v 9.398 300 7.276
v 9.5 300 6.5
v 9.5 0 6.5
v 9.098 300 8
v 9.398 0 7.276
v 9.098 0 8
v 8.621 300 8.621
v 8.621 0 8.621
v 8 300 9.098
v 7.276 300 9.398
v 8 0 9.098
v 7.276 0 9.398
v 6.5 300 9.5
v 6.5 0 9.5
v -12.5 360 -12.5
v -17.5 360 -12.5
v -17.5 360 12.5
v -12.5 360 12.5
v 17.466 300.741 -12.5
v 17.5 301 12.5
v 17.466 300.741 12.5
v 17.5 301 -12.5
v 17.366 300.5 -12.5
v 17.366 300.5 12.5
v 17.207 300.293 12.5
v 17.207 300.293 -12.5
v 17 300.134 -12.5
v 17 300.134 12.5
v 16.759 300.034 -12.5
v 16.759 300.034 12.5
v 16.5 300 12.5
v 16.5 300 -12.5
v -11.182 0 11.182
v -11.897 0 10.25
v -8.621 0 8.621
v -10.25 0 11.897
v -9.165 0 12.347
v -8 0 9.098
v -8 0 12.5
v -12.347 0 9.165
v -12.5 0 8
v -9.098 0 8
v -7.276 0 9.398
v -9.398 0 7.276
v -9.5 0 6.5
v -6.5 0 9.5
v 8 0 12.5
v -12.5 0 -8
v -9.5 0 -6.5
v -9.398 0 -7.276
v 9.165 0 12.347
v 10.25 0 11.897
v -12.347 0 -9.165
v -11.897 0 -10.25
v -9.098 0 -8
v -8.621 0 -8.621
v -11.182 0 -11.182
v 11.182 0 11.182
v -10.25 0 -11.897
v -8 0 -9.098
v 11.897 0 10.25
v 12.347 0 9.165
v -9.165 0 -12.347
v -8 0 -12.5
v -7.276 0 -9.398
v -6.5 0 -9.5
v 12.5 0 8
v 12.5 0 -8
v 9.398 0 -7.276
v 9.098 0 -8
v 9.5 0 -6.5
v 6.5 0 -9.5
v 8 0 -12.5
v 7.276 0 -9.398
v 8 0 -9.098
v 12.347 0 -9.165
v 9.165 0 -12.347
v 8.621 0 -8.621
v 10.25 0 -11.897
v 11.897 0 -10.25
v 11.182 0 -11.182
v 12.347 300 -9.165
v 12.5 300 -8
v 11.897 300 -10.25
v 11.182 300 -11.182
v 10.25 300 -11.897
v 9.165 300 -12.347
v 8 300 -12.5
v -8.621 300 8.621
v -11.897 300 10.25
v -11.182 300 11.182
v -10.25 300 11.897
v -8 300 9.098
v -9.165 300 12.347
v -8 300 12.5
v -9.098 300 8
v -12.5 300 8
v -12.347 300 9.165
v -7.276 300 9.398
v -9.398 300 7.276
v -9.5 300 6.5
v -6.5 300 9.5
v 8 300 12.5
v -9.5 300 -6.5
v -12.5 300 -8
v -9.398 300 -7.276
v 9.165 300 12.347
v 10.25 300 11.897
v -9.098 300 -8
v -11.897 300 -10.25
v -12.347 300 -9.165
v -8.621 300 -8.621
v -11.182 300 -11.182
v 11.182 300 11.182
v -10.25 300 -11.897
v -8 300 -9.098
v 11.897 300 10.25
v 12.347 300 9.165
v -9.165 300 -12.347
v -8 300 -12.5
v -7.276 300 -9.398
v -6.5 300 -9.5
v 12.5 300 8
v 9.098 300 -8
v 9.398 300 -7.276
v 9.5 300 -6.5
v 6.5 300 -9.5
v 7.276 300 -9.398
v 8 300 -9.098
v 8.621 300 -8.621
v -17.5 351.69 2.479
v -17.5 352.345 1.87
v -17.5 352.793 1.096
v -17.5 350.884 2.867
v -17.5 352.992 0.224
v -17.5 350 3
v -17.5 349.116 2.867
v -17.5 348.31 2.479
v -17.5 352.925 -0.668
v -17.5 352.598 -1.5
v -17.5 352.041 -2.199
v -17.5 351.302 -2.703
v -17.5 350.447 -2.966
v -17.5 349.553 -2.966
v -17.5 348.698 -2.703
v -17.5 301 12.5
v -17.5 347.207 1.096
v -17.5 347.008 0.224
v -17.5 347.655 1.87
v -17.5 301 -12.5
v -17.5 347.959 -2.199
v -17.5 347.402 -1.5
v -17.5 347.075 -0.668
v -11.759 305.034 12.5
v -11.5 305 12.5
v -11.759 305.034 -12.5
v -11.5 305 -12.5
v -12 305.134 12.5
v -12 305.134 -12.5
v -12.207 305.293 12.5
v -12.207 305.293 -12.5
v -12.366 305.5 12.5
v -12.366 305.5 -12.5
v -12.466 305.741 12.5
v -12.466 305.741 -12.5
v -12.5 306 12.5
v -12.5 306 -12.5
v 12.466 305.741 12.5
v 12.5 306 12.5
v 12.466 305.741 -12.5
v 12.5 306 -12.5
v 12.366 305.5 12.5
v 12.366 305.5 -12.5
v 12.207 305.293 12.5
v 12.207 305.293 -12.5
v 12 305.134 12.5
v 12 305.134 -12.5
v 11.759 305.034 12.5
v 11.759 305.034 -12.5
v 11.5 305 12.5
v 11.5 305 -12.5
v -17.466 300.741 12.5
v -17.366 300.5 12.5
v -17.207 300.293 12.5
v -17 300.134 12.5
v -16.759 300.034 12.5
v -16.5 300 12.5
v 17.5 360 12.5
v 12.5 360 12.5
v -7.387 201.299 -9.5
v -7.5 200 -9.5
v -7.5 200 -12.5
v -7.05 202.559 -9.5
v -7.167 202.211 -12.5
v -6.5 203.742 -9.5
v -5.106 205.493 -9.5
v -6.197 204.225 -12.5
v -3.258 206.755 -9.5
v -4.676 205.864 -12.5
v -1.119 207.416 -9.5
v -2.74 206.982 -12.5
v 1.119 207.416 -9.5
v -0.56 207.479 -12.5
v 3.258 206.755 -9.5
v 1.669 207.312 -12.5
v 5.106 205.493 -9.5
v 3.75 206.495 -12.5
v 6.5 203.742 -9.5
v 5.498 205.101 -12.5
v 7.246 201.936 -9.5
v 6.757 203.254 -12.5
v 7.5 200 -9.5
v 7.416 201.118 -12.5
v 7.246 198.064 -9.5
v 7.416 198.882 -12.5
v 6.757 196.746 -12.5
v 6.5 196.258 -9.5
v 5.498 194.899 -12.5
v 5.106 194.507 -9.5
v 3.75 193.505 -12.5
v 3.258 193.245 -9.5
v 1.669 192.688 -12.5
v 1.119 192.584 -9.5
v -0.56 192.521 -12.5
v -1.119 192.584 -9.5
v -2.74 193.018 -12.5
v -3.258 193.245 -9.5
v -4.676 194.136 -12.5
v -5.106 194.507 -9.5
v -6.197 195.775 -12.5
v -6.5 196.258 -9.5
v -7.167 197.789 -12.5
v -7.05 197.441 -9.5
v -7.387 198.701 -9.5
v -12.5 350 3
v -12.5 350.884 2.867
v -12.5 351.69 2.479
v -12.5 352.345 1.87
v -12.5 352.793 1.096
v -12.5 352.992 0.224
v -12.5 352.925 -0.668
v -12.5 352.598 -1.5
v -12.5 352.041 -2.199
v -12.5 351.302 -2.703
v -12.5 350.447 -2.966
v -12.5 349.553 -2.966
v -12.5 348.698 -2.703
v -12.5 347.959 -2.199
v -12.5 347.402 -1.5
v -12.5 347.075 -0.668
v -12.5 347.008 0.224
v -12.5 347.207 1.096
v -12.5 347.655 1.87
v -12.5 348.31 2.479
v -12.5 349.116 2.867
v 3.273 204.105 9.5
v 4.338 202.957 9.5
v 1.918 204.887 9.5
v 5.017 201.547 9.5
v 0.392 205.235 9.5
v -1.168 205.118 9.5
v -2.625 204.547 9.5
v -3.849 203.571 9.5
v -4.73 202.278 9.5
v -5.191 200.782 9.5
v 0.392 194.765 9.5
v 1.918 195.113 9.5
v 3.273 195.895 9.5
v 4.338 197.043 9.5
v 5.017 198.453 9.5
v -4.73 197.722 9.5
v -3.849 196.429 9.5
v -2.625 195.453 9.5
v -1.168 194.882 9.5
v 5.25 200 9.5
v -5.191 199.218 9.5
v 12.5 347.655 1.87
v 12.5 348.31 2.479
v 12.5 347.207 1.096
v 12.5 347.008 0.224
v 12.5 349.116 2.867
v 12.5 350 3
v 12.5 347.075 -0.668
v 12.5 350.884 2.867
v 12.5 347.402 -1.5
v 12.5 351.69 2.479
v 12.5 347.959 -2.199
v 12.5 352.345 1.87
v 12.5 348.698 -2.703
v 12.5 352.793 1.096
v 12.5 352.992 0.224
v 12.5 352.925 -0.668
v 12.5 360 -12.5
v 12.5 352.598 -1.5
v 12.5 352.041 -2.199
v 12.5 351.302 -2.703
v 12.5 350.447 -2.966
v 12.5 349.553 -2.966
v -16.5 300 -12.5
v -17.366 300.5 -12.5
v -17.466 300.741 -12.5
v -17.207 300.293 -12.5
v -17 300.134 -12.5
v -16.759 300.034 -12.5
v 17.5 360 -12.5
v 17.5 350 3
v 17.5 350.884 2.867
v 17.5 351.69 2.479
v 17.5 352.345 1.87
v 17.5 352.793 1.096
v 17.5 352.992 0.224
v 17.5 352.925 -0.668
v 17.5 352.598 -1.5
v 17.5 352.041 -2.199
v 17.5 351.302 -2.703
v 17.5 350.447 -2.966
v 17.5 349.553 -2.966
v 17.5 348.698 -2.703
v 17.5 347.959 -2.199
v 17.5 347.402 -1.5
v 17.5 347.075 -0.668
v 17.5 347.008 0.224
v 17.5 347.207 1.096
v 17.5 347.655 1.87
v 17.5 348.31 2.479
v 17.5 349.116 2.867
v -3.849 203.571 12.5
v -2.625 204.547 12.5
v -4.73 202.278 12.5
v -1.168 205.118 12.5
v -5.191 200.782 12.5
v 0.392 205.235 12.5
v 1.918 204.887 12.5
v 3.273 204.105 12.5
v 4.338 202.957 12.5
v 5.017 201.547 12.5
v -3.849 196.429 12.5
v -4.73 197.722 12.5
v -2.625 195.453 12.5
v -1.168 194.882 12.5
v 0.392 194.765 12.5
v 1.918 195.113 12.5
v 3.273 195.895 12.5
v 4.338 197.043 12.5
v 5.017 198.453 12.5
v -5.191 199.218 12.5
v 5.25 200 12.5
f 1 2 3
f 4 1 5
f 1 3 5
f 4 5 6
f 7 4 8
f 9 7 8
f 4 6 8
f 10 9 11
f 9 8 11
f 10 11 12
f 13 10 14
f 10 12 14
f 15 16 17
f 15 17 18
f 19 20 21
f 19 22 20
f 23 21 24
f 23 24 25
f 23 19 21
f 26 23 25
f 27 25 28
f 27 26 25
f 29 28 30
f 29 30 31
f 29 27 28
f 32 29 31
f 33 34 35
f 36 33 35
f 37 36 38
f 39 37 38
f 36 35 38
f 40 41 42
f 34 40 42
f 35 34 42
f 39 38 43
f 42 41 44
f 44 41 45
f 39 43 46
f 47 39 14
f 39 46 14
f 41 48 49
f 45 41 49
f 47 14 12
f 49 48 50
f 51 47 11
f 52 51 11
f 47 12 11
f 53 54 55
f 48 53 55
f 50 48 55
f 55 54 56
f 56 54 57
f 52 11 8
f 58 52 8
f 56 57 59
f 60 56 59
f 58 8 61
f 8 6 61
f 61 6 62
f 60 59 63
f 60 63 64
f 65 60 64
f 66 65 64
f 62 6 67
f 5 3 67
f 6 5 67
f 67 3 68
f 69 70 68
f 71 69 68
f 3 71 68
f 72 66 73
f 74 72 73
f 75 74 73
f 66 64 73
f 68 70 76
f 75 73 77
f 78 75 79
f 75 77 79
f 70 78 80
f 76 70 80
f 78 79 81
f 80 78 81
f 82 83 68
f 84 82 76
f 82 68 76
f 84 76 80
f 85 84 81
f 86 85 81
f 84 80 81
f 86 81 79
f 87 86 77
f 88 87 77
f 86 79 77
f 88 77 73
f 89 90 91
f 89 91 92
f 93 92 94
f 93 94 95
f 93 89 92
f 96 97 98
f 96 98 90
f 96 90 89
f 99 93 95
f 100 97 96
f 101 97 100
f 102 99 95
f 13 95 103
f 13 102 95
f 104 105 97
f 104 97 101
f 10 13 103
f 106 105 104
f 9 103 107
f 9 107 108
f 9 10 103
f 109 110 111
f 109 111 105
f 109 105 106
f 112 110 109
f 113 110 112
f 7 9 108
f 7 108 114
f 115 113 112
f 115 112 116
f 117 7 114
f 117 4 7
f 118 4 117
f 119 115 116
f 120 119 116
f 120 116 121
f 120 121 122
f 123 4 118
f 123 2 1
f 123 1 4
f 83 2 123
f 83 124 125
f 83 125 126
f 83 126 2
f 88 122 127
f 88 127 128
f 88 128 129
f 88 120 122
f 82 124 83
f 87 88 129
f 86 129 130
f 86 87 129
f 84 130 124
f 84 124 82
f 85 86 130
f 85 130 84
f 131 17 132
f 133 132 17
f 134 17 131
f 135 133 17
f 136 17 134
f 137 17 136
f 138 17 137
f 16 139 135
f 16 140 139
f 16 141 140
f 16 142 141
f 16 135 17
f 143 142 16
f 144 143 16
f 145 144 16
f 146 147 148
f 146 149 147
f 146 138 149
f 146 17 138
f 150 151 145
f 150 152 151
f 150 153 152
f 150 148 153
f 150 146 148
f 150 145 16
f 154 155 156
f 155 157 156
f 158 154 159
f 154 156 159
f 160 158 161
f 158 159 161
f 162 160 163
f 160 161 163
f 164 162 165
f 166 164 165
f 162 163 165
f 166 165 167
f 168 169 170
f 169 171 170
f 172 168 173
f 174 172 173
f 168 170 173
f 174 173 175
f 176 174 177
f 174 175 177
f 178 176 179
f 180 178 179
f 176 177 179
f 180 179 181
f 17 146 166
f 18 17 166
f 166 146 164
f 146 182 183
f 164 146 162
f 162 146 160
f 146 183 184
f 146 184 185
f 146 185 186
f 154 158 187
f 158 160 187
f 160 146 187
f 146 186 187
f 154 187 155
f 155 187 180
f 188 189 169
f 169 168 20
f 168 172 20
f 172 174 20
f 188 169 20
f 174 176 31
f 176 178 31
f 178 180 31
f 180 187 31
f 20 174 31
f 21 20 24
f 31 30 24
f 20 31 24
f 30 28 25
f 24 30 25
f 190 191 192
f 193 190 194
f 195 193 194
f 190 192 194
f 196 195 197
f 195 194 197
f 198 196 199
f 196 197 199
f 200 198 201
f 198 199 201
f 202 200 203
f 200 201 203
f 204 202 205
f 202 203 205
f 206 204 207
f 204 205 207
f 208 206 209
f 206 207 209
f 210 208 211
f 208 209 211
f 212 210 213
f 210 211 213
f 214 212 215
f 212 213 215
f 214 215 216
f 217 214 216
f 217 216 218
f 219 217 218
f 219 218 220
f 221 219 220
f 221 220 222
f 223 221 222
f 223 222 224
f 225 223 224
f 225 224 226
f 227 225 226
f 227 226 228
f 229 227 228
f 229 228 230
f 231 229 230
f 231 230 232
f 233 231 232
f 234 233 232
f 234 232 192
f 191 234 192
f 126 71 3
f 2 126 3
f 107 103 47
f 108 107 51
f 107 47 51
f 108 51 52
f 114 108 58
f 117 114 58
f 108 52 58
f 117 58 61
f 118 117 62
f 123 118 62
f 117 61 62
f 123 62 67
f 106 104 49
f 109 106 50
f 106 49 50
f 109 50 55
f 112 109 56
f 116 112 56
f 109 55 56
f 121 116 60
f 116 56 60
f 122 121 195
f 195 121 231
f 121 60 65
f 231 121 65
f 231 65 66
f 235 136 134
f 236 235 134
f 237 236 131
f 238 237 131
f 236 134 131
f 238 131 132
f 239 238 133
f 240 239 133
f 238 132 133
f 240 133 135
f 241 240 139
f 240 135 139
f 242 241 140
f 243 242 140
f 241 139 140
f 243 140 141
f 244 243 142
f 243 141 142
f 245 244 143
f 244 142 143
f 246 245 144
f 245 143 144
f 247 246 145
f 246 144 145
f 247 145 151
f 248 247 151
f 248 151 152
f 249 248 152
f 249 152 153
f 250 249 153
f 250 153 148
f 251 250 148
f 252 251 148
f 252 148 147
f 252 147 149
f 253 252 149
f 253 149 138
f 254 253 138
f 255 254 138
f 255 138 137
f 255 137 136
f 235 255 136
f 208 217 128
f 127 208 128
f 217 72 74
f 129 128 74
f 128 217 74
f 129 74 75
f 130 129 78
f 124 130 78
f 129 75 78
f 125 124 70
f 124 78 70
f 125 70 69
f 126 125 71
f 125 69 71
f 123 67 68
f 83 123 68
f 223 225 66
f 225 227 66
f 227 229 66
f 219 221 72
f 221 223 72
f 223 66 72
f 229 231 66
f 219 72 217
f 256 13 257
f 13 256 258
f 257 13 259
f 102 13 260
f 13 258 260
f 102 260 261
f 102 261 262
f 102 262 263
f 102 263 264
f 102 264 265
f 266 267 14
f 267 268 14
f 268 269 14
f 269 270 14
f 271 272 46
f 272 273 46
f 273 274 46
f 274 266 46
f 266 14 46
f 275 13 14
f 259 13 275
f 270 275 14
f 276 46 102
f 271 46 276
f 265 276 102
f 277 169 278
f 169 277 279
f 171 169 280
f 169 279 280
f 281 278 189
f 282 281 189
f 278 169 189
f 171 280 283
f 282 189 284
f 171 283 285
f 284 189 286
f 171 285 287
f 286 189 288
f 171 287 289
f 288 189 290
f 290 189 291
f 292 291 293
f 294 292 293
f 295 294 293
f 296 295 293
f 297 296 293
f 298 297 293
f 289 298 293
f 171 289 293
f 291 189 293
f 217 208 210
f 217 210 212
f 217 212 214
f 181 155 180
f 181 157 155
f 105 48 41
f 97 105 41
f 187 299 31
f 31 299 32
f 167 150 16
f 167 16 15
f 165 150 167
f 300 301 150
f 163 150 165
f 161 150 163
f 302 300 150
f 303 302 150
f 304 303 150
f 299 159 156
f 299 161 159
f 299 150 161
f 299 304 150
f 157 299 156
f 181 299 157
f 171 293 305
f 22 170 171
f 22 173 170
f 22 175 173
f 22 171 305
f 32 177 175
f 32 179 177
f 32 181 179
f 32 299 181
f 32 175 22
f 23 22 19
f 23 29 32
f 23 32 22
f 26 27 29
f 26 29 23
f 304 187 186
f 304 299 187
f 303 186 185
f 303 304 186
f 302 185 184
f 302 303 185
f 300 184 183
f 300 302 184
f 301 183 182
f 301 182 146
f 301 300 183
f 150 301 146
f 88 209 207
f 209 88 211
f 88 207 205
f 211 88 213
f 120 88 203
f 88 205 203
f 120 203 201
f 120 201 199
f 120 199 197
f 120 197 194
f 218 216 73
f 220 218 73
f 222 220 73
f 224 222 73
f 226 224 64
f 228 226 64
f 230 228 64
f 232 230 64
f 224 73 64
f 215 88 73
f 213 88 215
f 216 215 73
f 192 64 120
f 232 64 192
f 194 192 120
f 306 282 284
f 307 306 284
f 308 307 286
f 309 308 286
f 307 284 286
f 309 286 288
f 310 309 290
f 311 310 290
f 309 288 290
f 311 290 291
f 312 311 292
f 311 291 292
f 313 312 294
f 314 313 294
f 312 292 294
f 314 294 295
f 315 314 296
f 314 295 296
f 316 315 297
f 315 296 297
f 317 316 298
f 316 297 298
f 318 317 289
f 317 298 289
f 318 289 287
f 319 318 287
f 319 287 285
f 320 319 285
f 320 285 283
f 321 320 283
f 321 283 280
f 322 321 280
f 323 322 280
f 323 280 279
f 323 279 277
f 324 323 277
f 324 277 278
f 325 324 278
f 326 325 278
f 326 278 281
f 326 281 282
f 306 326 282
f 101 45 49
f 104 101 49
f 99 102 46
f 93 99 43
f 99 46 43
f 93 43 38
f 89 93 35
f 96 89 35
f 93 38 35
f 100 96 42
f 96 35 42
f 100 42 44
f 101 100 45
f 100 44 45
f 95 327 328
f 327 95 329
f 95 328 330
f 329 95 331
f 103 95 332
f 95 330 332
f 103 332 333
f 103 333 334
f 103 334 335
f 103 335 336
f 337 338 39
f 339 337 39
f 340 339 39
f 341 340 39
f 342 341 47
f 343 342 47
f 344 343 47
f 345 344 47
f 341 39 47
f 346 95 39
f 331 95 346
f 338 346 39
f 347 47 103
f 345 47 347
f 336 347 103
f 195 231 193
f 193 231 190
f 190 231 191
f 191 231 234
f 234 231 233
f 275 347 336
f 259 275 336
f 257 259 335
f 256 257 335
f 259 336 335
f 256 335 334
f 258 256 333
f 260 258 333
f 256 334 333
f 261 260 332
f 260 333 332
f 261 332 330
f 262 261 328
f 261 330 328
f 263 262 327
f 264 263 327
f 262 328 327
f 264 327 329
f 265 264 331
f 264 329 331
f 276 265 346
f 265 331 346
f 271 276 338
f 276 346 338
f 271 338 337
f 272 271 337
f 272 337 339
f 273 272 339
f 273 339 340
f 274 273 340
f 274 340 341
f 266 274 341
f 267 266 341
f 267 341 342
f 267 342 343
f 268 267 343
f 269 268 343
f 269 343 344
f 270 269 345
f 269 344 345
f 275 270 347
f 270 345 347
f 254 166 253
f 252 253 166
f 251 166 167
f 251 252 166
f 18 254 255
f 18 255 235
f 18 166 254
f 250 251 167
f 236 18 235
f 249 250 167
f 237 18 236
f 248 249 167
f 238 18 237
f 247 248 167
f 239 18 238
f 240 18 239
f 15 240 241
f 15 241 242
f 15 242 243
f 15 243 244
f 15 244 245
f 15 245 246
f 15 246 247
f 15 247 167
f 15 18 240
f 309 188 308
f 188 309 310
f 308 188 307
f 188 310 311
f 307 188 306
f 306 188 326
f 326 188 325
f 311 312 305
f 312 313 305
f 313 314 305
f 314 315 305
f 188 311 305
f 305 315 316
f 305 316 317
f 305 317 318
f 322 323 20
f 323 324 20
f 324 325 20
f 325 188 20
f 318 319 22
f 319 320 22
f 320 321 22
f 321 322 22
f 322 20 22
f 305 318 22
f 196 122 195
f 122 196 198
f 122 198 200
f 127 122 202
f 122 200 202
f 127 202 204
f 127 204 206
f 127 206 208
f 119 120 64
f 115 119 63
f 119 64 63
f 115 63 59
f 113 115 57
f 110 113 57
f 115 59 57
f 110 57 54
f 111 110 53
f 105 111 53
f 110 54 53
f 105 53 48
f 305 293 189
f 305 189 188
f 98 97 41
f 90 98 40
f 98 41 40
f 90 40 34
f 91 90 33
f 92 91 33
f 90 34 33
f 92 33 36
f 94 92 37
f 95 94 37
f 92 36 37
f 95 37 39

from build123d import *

# Parameters (mm, degrees)
BOSS_EXTRUDE1_DEPTH = 300
SKETCH2_R           = 7.5
CUT_EXTRUDE1_DEPTH  = 3
SKETCH3_R           = 5.25
CUT_EXTRUDE2_DEPTH  = 3
SKETCH5_W           = 35
SKETCH5_H           = 25
BOSS_EXTRUDE2_DEPTH = 60
SKETCH7_W           = 25
SKETCH7_H           = 25
CUT_EXTRUDE4_DEPTH  = 55
SKETCH8_R           = 3
CUT_EXTRUDE5_DEPTH  = 55
FILLET1_R           = 1
FILLET2_R           = 1


with BuildPart() as part:
    # Sketch1 → Boss-Extrude1 (new body)
    with BuildSketch(Plane(origin=(0, 0, 0), x_dir=(1, 0, 0), z_dir=(0, 1, 0))):
        with BuildLine():
            Line((8, 12.5), (-8, 12.5))
            ThreePointArc((-8, 12.5), (-11.181980515, 11.181980515), (-12.5, 8))
            Line((-12.5, 8), (-12.5, -8))
            ThreePointArc((-12.5, -8), (-11.181980515, -11.181980515), (-8, -12.5))
            Line((-8, -12.5), (8, -12.5))
            ThreePointArc((8, -12.5), (11.181980515, -11.181980515), (12.5, -8))
            Line((12.5, -8), (12.5, 8))
            ThreePointArc((12.5, 8), (11.181980515, 11.181980515), (8, 12.5))
        make_face()
        with BuildLine():
            Line((-6.5, 9.5), (6.5, 9.5))
            ThreePointArc((6.5, 9.5), (8.621320344, 8.621320344), (9.5, 6.5))
            Line((9.5, 6.5), (9.5, -6.5))
            ThreePointArc((9.5, -6.5), (8.621320344, -8.621320344), (6.5, -9.5))
            Line((6.5, -9.5), (-6.5, -9.5))
            ThreePointArc((-6.5, -9.5), (-8.621320344, -8.621320344), (-9.5, -6.5))
            Line((-9.5, -6.5), (-9.5, 6.5))
            ThreePointArc((-9.5, 6.5), (-8.621320344, 8.621320344), (-6.5, 9.5))
        make_face(mode=Mode.SUBTRACT)
    extrude(amount=BOSS_EXTRUDE1_DEPTH)

    # Sketch2 → Cut-Extrude1 (cut)
    with BuildSketch(Plane(origin=(0, 0, -12.5), x_dir=(-1, 0, 0), z_dir=(0, 0, -1))):
        with Locations((0, 200)):
            Circle(SKETCH2_R)
    extrude(amount=-CUT_EXTRUDE1_DEPTH, mode=Mode.SUBTRACT)

    # Sketch3 → Cut-Extrude2 (cut)
    with BuildSketch(Plane.XY.offset(12.5)):
        with Locations((0, 200)):
            Circle(SKETCH3_R)
    extrude(amount=-CUT_EXTRUDE2_DEPTH, mode=Mode.SUBTRACT)


with BuildPart() as body_2:
    # Sketch5 → Boss-Extrude2 (new body)
    with BuildSketch(Plane(origin=(0, 300, 0), x_dir=(1, 0, 0), z_dir=(0, 1, 0))):
        Rectangle(SKETCH5_W, SKETCH5_H)
    extrude(amount=BOSS_EXTRUDE2_DEPTH)

    # Sketch7 → Cut-Extrude4 (cut)
    with BuildSketch(Plane(origin=(0, 360, 0), x_dir=(1, 0, 0), z_dir=(0, 1, 0))):
        Rectangle(SKETCH7_W, SKETCH7_H)
    extrude(amount=-CUT_EXTRUDE4_DEPTH, mode=Mode.SUBTRACT)

    # Sketch8 → Cut-Extrude5 (cut)
    with BuildSketch(Plane.ZY.offset(17.5)):
        with Locations((0, 350)):
            Circle(SKETCH8_R)
    extrude(amount=-CUT_EXTRUDE5_DEPTH, mode=Mode.SUBTRACT)

    # Fillet1
    fillet1_edges = [body_2.edges().sort_by_distance(p)[0] for p in [
        (-12.5, 305, 0),
        (12.5, 305, 0),
    ]]
    fillet(fillet1_edges, radius=FILLET1_R)

    # Fillet2
    fillet2_edges = [body_2.edges().sort_by_distance(p)[0] for p in [
        (17.5, 300, 0),
        (-17.5, 300, 0),
    ]]
    fillet(fillet2_edges, radius=FILLET2_R)


solid = Compound([part.part, body_2.part])
